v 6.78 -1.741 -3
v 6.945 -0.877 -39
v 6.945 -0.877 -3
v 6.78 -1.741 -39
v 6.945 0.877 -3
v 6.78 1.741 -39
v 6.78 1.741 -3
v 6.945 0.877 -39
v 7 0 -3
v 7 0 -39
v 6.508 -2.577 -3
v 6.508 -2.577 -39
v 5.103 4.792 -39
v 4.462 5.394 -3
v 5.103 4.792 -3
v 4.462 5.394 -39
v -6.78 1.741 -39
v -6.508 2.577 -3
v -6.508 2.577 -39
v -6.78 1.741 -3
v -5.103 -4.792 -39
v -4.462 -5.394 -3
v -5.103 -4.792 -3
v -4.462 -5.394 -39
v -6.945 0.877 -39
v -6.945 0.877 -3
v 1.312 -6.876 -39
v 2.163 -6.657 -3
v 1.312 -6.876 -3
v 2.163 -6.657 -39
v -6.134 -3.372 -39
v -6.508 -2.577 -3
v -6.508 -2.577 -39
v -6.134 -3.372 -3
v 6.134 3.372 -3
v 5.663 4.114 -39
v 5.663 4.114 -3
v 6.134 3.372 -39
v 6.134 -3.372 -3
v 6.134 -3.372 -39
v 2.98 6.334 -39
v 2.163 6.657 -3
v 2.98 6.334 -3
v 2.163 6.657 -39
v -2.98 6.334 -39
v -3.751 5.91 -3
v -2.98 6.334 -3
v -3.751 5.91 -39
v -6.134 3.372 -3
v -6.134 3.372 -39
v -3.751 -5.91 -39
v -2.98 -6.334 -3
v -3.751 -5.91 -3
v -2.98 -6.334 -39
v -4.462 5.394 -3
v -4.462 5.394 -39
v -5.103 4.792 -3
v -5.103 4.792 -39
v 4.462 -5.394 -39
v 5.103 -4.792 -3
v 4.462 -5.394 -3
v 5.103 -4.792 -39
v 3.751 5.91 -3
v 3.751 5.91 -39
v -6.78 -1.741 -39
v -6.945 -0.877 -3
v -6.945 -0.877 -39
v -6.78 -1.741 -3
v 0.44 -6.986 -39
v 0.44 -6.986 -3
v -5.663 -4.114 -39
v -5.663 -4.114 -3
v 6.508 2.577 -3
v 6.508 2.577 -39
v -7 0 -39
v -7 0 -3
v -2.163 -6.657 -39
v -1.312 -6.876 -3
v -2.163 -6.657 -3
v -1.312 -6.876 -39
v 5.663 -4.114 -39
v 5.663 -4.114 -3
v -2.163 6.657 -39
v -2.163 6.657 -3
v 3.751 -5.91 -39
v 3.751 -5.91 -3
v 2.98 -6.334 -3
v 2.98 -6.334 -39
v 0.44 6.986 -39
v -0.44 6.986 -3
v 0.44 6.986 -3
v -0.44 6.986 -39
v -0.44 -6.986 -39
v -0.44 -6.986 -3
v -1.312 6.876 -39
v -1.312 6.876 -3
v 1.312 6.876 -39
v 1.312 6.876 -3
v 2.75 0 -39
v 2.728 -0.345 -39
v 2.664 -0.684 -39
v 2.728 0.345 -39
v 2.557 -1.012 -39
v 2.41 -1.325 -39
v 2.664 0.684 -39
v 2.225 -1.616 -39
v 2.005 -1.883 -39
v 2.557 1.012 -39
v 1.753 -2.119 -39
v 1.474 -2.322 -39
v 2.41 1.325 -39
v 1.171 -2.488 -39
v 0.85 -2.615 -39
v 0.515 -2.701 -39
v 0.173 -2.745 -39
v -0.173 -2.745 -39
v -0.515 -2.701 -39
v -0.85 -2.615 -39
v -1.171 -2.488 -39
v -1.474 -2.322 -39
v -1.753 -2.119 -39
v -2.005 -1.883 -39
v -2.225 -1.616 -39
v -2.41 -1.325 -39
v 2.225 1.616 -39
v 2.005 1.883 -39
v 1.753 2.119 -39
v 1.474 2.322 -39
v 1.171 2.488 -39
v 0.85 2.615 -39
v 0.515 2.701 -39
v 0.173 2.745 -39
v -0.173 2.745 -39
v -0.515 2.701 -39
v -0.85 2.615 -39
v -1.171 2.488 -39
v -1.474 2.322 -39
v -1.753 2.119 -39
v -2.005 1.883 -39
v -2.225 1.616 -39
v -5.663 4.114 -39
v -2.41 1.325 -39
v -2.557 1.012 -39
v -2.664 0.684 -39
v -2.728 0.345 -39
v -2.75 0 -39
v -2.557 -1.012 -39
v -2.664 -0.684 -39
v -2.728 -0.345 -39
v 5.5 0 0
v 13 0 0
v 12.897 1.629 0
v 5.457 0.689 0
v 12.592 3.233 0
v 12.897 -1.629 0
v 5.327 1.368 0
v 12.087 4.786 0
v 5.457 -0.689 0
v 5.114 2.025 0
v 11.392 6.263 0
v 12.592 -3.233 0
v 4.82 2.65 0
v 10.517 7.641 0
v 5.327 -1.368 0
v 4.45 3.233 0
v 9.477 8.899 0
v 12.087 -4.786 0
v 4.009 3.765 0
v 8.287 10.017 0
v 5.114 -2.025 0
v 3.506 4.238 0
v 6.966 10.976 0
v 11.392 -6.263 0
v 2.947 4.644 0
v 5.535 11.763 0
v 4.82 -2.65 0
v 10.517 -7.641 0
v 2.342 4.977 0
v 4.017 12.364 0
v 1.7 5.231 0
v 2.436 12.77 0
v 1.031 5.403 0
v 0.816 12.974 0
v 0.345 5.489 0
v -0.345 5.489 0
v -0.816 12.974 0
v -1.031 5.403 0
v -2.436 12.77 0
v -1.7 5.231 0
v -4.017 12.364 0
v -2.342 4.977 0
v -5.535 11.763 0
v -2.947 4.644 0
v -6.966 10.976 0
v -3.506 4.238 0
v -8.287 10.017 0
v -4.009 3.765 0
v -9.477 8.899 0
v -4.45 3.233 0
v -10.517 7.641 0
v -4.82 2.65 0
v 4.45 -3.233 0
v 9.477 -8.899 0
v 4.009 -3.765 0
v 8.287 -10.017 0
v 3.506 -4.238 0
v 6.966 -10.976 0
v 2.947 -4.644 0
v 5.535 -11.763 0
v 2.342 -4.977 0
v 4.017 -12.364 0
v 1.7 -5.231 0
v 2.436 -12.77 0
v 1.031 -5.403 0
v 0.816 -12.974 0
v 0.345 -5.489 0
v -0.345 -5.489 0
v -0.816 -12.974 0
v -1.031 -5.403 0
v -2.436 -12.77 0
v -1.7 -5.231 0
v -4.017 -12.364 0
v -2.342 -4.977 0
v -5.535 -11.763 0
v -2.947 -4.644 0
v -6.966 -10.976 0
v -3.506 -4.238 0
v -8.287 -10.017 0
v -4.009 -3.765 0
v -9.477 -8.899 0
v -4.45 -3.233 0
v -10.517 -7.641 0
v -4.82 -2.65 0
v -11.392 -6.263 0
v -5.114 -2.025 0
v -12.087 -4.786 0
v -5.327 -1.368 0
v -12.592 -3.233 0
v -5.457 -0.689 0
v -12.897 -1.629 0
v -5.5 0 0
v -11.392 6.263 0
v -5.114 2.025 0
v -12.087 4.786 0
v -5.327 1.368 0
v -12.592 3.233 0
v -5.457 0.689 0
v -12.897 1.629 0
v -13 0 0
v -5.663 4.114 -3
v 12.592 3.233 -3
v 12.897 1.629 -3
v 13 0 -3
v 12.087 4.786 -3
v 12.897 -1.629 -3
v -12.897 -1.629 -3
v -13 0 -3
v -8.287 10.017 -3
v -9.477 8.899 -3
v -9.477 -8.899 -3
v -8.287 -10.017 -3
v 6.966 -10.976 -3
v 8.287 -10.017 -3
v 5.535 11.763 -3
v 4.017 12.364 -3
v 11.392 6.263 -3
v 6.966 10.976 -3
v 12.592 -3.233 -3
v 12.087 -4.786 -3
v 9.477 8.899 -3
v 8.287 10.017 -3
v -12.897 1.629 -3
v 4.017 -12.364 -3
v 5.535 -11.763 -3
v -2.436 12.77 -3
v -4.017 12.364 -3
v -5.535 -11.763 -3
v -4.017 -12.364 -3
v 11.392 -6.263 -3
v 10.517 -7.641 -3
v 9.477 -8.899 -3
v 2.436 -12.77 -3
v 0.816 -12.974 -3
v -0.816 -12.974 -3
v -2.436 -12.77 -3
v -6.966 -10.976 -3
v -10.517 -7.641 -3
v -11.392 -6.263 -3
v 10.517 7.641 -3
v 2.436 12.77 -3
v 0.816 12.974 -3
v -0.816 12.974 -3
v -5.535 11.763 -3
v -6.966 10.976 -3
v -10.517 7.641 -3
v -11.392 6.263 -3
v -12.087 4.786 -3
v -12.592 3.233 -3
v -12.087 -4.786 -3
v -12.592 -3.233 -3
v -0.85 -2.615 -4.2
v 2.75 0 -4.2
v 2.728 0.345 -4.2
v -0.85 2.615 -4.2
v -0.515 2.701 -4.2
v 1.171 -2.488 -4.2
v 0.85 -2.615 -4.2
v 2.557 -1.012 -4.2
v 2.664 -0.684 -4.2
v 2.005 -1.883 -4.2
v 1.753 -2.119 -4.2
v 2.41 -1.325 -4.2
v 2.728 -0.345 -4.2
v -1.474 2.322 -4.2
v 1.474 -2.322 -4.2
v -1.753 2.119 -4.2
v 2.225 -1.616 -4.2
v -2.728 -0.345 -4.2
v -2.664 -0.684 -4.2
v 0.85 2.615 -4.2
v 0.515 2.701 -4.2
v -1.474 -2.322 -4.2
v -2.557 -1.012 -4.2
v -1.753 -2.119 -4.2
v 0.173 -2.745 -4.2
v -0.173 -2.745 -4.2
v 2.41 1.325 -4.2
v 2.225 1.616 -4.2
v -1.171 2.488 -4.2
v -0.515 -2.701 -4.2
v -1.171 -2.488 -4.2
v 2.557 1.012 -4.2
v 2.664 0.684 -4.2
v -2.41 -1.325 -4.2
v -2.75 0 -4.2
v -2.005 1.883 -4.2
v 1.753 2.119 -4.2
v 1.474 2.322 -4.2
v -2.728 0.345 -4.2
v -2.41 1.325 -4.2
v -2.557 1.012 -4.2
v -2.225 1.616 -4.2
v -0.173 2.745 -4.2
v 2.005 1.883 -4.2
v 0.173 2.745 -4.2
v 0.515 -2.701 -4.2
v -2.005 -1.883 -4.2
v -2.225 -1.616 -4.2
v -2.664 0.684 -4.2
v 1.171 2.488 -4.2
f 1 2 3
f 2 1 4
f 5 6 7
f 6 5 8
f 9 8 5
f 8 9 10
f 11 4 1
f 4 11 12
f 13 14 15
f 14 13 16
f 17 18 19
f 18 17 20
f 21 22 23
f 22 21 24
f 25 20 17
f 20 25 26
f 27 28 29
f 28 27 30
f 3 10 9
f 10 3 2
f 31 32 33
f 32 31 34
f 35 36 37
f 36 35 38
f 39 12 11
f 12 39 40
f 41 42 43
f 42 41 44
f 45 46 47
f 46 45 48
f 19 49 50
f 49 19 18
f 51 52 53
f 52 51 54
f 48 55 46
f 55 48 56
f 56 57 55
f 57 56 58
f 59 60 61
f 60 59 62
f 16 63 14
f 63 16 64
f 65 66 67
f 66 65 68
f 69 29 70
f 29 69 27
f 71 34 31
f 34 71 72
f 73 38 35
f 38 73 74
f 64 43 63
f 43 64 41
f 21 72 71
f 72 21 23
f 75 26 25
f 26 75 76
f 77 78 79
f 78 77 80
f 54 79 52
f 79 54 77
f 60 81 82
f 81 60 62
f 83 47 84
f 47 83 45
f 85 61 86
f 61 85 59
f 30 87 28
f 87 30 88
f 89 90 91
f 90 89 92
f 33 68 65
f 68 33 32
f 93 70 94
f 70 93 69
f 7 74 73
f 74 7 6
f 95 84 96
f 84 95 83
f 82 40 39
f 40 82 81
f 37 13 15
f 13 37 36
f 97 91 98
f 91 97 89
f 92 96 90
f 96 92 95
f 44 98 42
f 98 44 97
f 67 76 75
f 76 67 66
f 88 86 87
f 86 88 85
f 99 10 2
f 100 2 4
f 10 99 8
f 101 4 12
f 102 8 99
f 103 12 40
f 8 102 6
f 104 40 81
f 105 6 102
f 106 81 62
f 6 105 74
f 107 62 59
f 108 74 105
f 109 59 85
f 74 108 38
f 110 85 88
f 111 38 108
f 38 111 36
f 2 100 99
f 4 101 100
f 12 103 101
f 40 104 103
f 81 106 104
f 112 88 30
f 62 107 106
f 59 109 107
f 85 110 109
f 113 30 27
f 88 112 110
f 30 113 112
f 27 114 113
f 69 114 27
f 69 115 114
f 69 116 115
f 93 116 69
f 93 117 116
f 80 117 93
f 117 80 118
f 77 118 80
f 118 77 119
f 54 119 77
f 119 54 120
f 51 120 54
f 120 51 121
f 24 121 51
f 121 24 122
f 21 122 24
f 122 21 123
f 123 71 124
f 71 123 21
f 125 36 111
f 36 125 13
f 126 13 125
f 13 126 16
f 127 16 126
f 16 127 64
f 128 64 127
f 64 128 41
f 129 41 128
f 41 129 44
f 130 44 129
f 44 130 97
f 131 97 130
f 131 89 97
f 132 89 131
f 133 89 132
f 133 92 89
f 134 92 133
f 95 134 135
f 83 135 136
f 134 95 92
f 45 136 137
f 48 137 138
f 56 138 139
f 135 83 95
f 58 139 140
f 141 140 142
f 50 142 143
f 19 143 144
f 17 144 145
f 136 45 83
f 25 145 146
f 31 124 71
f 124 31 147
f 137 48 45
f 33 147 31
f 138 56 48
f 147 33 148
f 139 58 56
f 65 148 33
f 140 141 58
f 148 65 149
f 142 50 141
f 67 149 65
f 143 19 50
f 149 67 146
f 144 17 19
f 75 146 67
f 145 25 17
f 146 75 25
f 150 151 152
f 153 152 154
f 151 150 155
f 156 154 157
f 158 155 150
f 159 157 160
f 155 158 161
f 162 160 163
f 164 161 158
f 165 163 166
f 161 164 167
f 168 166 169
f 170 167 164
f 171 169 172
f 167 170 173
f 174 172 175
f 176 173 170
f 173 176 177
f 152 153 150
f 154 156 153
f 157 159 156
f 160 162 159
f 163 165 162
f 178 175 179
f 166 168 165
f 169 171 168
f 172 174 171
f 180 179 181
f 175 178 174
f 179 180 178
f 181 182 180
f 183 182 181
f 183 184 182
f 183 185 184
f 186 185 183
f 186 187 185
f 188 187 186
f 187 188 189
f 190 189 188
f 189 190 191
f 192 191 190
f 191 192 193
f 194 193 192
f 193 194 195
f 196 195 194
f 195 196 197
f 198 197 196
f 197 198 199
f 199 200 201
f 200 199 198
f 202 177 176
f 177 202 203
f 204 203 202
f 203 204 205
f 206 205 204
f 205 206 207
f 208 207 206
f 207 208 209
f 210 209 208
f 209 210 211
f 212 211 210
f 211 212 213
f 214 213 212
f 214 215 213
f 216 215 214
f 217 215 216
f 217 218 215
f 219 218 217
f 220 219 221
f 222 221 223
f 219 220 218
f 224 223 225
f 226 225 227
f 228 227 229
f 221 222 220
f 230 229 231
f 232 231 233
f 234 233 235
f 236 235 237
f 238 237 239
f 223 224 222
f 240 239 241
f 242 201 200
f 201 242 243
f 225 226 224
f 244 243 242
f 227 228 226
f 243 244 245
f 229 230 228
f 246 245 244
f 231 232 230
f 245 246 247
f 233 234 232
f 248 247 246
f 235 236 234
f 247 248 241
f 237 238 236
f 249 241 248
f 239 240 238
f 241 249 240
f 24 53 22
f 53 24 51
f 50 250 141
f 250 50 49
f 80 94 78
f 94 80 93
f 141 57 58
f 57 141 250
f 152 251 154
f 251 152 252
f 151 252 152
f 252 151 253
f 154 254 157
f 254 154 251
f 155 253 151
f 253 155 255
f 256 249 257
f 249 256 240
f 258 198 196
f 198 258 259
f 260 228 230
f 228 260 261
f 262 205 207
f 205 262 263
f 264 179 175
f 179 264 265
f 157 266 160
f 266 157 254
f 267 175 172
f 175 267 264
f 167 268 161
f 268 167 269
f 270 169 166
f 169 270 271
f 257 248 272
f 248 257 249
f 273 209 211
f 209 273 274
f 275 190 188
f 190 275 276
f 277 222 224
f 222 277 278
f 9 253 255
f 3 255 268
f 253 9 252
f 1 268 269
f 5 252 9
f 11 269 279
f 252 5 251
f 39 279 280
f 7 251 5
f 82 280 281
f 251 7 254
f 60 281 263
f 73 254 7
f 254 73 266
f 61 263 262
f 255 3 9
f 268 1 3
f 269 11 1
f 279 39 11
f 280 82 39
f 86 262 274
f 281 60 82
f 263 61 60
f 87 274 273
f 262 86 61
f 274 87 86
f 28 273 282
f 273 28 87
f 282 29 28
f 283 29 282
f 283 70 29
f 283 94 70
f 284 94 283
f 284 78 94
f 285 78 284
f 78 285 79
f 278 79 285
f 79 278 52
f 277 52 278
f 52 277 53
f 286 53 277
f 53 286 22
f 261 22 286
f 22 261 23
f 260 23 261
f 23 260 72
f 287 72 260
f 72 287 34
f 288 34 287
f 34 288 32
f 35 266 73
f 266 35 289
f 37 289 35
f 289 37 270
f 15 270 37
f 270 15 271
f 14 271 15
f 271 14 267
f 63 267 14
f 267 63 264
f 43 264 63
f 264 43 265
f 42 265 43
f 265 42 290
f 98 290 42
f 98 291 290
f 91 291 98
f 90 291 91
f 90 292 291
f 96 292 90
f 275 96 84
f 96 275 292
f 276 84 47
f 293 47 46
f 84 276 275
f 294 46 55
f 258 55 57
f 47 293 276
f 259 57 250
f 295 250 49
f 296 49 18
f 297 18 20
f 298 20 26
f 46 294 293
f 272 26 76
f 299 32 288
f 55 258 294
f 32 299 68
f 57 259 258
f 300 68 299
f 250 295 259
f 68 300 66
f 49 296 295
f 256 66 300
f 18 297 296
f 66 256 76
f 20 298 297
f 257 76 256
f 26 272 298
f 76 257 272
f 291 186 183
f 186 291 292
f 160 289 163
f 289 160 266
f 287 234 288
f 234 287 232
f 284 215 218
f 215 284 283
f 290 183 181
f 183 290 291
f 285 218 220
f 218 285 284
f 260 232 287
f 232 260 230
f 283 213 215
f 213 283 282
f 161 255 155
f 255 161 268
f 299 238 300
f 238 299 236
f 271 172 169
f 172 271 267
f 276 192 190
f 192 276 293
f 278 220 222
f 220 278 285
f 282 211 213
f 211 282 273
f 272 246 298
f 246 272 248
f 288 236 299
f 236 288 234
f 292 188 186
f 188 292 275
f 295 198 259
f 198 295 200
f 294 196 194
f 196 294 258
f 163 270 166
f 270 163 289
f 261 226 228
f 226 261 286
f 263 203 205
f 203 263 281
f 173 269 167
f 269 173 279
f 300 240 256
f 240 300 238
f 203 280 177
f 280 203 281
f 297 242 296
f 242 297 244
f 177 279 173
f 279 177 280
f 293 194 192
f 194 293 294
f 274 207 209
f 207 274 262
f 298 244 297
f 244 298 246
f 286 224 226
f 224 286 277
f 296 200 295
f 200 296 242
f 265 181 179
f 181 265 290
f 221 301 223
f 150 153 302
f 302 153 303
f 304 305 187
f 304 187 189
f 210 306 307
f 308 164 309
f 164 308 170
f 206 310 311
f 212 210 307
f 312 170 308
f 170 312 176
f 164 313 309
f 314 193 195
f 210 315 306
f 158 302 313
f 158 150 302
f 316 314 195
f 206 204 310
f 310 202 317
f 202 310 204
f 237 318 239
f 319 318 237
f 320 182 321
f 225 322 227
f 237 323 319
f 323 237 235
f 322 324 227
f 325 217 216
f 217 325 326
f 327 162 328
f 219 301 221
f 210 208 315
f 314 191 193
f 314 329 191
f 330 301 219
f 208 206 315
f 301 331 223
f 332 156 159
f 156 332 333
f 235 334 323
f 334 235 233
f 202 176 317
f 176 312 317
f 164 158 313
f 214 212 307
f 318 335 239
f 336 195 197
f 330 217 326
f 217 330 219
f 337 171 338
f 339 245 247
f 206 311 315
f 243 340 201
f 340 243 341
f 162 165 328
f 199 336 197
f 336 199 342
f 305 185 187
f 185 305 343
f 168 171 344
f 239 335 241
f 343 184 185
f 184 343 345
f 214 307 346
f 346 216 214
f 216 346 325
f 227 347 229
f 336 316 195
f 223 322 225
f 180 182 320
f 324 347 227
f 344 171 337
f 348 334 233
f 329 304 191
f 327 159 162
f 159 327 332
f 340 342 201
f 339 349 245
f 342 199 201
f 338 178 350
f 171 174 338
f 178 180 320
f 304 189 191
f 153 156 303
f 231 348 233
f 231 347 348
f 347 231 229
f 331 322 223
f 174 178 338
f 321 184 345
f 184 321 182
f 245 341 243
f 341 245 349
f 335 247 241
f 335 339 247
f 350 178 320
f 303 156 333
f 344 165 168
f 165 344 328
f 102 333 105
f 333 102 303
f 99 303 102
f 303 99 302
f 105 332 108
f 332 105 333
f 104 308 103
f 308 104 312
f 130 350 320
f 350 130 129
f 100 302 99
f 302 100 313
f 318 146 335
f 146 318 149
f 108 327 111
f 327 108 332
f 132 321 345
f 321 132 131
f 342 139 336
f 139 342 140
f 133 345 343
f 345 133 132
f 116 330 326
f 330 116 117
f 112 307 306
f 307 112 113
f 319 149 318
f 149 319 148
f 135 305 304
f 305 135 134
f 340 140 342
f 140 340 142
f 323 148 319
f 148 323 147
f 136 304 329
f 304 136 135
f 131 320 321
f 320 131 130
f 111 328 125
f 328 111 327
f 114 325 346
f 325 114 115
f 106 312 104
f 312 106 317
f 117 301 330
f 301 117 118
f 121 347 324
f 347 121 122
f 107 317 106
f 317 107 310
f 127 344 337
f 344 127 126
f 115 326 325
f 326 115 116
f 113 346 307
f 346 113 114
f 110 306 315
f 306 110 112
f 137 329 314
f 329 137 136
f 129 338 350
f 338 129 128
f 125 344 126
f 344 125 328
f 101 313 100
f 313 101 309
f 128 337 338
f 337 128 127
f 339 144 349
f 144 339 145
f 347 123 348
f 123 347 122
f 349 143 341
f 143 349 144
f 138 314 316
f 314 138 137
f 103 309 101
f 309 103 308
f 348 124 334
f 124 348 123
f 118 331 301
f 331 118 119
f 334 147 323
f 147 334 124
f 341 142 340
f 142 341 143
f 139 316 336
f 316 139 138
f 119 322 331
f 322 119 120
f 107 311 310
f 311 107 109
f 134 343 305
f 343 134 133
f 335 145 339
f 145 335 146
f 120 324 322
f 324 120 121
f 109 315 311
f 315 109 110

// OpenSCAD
$fn = 50;


difference() {
	union() {
		translate(v = [0, 0, -39.0000000000]) {
			cylinder(h = 39, r = 7.0000000000);
		}
		translate(v = [0, 0, -3.0000000000]) {
			cylinder(h = 3, r = 13.0000000000);
		}
	}
	union() {
		translate(v = [0, 0, 0]) {
			rotate(a = [0, 0, 0]) {
				difference() {
					union() {
						#translate(v = [0, 0, -39.0000000000]) {
							cylinder(h = 39, r = 2.2500000000);
						}
						#translate(v = [0, 0, -4.2000000000]) {
							cylinder(h = 4.2000000000, r1 = 2.7500000000, r2 = 5.5000000000);
						}
						#translate(v = [0, 0, -39.0000000000]) {
							cylinder(h = 39, r = 2.7500000000);
						}
						#translate(v = [0, 0, -39.0000000000]) {
							cylinder(h = 39, r = 2.2500000000);
						}
					}
					union();
				}
			}
		}
	}
}
